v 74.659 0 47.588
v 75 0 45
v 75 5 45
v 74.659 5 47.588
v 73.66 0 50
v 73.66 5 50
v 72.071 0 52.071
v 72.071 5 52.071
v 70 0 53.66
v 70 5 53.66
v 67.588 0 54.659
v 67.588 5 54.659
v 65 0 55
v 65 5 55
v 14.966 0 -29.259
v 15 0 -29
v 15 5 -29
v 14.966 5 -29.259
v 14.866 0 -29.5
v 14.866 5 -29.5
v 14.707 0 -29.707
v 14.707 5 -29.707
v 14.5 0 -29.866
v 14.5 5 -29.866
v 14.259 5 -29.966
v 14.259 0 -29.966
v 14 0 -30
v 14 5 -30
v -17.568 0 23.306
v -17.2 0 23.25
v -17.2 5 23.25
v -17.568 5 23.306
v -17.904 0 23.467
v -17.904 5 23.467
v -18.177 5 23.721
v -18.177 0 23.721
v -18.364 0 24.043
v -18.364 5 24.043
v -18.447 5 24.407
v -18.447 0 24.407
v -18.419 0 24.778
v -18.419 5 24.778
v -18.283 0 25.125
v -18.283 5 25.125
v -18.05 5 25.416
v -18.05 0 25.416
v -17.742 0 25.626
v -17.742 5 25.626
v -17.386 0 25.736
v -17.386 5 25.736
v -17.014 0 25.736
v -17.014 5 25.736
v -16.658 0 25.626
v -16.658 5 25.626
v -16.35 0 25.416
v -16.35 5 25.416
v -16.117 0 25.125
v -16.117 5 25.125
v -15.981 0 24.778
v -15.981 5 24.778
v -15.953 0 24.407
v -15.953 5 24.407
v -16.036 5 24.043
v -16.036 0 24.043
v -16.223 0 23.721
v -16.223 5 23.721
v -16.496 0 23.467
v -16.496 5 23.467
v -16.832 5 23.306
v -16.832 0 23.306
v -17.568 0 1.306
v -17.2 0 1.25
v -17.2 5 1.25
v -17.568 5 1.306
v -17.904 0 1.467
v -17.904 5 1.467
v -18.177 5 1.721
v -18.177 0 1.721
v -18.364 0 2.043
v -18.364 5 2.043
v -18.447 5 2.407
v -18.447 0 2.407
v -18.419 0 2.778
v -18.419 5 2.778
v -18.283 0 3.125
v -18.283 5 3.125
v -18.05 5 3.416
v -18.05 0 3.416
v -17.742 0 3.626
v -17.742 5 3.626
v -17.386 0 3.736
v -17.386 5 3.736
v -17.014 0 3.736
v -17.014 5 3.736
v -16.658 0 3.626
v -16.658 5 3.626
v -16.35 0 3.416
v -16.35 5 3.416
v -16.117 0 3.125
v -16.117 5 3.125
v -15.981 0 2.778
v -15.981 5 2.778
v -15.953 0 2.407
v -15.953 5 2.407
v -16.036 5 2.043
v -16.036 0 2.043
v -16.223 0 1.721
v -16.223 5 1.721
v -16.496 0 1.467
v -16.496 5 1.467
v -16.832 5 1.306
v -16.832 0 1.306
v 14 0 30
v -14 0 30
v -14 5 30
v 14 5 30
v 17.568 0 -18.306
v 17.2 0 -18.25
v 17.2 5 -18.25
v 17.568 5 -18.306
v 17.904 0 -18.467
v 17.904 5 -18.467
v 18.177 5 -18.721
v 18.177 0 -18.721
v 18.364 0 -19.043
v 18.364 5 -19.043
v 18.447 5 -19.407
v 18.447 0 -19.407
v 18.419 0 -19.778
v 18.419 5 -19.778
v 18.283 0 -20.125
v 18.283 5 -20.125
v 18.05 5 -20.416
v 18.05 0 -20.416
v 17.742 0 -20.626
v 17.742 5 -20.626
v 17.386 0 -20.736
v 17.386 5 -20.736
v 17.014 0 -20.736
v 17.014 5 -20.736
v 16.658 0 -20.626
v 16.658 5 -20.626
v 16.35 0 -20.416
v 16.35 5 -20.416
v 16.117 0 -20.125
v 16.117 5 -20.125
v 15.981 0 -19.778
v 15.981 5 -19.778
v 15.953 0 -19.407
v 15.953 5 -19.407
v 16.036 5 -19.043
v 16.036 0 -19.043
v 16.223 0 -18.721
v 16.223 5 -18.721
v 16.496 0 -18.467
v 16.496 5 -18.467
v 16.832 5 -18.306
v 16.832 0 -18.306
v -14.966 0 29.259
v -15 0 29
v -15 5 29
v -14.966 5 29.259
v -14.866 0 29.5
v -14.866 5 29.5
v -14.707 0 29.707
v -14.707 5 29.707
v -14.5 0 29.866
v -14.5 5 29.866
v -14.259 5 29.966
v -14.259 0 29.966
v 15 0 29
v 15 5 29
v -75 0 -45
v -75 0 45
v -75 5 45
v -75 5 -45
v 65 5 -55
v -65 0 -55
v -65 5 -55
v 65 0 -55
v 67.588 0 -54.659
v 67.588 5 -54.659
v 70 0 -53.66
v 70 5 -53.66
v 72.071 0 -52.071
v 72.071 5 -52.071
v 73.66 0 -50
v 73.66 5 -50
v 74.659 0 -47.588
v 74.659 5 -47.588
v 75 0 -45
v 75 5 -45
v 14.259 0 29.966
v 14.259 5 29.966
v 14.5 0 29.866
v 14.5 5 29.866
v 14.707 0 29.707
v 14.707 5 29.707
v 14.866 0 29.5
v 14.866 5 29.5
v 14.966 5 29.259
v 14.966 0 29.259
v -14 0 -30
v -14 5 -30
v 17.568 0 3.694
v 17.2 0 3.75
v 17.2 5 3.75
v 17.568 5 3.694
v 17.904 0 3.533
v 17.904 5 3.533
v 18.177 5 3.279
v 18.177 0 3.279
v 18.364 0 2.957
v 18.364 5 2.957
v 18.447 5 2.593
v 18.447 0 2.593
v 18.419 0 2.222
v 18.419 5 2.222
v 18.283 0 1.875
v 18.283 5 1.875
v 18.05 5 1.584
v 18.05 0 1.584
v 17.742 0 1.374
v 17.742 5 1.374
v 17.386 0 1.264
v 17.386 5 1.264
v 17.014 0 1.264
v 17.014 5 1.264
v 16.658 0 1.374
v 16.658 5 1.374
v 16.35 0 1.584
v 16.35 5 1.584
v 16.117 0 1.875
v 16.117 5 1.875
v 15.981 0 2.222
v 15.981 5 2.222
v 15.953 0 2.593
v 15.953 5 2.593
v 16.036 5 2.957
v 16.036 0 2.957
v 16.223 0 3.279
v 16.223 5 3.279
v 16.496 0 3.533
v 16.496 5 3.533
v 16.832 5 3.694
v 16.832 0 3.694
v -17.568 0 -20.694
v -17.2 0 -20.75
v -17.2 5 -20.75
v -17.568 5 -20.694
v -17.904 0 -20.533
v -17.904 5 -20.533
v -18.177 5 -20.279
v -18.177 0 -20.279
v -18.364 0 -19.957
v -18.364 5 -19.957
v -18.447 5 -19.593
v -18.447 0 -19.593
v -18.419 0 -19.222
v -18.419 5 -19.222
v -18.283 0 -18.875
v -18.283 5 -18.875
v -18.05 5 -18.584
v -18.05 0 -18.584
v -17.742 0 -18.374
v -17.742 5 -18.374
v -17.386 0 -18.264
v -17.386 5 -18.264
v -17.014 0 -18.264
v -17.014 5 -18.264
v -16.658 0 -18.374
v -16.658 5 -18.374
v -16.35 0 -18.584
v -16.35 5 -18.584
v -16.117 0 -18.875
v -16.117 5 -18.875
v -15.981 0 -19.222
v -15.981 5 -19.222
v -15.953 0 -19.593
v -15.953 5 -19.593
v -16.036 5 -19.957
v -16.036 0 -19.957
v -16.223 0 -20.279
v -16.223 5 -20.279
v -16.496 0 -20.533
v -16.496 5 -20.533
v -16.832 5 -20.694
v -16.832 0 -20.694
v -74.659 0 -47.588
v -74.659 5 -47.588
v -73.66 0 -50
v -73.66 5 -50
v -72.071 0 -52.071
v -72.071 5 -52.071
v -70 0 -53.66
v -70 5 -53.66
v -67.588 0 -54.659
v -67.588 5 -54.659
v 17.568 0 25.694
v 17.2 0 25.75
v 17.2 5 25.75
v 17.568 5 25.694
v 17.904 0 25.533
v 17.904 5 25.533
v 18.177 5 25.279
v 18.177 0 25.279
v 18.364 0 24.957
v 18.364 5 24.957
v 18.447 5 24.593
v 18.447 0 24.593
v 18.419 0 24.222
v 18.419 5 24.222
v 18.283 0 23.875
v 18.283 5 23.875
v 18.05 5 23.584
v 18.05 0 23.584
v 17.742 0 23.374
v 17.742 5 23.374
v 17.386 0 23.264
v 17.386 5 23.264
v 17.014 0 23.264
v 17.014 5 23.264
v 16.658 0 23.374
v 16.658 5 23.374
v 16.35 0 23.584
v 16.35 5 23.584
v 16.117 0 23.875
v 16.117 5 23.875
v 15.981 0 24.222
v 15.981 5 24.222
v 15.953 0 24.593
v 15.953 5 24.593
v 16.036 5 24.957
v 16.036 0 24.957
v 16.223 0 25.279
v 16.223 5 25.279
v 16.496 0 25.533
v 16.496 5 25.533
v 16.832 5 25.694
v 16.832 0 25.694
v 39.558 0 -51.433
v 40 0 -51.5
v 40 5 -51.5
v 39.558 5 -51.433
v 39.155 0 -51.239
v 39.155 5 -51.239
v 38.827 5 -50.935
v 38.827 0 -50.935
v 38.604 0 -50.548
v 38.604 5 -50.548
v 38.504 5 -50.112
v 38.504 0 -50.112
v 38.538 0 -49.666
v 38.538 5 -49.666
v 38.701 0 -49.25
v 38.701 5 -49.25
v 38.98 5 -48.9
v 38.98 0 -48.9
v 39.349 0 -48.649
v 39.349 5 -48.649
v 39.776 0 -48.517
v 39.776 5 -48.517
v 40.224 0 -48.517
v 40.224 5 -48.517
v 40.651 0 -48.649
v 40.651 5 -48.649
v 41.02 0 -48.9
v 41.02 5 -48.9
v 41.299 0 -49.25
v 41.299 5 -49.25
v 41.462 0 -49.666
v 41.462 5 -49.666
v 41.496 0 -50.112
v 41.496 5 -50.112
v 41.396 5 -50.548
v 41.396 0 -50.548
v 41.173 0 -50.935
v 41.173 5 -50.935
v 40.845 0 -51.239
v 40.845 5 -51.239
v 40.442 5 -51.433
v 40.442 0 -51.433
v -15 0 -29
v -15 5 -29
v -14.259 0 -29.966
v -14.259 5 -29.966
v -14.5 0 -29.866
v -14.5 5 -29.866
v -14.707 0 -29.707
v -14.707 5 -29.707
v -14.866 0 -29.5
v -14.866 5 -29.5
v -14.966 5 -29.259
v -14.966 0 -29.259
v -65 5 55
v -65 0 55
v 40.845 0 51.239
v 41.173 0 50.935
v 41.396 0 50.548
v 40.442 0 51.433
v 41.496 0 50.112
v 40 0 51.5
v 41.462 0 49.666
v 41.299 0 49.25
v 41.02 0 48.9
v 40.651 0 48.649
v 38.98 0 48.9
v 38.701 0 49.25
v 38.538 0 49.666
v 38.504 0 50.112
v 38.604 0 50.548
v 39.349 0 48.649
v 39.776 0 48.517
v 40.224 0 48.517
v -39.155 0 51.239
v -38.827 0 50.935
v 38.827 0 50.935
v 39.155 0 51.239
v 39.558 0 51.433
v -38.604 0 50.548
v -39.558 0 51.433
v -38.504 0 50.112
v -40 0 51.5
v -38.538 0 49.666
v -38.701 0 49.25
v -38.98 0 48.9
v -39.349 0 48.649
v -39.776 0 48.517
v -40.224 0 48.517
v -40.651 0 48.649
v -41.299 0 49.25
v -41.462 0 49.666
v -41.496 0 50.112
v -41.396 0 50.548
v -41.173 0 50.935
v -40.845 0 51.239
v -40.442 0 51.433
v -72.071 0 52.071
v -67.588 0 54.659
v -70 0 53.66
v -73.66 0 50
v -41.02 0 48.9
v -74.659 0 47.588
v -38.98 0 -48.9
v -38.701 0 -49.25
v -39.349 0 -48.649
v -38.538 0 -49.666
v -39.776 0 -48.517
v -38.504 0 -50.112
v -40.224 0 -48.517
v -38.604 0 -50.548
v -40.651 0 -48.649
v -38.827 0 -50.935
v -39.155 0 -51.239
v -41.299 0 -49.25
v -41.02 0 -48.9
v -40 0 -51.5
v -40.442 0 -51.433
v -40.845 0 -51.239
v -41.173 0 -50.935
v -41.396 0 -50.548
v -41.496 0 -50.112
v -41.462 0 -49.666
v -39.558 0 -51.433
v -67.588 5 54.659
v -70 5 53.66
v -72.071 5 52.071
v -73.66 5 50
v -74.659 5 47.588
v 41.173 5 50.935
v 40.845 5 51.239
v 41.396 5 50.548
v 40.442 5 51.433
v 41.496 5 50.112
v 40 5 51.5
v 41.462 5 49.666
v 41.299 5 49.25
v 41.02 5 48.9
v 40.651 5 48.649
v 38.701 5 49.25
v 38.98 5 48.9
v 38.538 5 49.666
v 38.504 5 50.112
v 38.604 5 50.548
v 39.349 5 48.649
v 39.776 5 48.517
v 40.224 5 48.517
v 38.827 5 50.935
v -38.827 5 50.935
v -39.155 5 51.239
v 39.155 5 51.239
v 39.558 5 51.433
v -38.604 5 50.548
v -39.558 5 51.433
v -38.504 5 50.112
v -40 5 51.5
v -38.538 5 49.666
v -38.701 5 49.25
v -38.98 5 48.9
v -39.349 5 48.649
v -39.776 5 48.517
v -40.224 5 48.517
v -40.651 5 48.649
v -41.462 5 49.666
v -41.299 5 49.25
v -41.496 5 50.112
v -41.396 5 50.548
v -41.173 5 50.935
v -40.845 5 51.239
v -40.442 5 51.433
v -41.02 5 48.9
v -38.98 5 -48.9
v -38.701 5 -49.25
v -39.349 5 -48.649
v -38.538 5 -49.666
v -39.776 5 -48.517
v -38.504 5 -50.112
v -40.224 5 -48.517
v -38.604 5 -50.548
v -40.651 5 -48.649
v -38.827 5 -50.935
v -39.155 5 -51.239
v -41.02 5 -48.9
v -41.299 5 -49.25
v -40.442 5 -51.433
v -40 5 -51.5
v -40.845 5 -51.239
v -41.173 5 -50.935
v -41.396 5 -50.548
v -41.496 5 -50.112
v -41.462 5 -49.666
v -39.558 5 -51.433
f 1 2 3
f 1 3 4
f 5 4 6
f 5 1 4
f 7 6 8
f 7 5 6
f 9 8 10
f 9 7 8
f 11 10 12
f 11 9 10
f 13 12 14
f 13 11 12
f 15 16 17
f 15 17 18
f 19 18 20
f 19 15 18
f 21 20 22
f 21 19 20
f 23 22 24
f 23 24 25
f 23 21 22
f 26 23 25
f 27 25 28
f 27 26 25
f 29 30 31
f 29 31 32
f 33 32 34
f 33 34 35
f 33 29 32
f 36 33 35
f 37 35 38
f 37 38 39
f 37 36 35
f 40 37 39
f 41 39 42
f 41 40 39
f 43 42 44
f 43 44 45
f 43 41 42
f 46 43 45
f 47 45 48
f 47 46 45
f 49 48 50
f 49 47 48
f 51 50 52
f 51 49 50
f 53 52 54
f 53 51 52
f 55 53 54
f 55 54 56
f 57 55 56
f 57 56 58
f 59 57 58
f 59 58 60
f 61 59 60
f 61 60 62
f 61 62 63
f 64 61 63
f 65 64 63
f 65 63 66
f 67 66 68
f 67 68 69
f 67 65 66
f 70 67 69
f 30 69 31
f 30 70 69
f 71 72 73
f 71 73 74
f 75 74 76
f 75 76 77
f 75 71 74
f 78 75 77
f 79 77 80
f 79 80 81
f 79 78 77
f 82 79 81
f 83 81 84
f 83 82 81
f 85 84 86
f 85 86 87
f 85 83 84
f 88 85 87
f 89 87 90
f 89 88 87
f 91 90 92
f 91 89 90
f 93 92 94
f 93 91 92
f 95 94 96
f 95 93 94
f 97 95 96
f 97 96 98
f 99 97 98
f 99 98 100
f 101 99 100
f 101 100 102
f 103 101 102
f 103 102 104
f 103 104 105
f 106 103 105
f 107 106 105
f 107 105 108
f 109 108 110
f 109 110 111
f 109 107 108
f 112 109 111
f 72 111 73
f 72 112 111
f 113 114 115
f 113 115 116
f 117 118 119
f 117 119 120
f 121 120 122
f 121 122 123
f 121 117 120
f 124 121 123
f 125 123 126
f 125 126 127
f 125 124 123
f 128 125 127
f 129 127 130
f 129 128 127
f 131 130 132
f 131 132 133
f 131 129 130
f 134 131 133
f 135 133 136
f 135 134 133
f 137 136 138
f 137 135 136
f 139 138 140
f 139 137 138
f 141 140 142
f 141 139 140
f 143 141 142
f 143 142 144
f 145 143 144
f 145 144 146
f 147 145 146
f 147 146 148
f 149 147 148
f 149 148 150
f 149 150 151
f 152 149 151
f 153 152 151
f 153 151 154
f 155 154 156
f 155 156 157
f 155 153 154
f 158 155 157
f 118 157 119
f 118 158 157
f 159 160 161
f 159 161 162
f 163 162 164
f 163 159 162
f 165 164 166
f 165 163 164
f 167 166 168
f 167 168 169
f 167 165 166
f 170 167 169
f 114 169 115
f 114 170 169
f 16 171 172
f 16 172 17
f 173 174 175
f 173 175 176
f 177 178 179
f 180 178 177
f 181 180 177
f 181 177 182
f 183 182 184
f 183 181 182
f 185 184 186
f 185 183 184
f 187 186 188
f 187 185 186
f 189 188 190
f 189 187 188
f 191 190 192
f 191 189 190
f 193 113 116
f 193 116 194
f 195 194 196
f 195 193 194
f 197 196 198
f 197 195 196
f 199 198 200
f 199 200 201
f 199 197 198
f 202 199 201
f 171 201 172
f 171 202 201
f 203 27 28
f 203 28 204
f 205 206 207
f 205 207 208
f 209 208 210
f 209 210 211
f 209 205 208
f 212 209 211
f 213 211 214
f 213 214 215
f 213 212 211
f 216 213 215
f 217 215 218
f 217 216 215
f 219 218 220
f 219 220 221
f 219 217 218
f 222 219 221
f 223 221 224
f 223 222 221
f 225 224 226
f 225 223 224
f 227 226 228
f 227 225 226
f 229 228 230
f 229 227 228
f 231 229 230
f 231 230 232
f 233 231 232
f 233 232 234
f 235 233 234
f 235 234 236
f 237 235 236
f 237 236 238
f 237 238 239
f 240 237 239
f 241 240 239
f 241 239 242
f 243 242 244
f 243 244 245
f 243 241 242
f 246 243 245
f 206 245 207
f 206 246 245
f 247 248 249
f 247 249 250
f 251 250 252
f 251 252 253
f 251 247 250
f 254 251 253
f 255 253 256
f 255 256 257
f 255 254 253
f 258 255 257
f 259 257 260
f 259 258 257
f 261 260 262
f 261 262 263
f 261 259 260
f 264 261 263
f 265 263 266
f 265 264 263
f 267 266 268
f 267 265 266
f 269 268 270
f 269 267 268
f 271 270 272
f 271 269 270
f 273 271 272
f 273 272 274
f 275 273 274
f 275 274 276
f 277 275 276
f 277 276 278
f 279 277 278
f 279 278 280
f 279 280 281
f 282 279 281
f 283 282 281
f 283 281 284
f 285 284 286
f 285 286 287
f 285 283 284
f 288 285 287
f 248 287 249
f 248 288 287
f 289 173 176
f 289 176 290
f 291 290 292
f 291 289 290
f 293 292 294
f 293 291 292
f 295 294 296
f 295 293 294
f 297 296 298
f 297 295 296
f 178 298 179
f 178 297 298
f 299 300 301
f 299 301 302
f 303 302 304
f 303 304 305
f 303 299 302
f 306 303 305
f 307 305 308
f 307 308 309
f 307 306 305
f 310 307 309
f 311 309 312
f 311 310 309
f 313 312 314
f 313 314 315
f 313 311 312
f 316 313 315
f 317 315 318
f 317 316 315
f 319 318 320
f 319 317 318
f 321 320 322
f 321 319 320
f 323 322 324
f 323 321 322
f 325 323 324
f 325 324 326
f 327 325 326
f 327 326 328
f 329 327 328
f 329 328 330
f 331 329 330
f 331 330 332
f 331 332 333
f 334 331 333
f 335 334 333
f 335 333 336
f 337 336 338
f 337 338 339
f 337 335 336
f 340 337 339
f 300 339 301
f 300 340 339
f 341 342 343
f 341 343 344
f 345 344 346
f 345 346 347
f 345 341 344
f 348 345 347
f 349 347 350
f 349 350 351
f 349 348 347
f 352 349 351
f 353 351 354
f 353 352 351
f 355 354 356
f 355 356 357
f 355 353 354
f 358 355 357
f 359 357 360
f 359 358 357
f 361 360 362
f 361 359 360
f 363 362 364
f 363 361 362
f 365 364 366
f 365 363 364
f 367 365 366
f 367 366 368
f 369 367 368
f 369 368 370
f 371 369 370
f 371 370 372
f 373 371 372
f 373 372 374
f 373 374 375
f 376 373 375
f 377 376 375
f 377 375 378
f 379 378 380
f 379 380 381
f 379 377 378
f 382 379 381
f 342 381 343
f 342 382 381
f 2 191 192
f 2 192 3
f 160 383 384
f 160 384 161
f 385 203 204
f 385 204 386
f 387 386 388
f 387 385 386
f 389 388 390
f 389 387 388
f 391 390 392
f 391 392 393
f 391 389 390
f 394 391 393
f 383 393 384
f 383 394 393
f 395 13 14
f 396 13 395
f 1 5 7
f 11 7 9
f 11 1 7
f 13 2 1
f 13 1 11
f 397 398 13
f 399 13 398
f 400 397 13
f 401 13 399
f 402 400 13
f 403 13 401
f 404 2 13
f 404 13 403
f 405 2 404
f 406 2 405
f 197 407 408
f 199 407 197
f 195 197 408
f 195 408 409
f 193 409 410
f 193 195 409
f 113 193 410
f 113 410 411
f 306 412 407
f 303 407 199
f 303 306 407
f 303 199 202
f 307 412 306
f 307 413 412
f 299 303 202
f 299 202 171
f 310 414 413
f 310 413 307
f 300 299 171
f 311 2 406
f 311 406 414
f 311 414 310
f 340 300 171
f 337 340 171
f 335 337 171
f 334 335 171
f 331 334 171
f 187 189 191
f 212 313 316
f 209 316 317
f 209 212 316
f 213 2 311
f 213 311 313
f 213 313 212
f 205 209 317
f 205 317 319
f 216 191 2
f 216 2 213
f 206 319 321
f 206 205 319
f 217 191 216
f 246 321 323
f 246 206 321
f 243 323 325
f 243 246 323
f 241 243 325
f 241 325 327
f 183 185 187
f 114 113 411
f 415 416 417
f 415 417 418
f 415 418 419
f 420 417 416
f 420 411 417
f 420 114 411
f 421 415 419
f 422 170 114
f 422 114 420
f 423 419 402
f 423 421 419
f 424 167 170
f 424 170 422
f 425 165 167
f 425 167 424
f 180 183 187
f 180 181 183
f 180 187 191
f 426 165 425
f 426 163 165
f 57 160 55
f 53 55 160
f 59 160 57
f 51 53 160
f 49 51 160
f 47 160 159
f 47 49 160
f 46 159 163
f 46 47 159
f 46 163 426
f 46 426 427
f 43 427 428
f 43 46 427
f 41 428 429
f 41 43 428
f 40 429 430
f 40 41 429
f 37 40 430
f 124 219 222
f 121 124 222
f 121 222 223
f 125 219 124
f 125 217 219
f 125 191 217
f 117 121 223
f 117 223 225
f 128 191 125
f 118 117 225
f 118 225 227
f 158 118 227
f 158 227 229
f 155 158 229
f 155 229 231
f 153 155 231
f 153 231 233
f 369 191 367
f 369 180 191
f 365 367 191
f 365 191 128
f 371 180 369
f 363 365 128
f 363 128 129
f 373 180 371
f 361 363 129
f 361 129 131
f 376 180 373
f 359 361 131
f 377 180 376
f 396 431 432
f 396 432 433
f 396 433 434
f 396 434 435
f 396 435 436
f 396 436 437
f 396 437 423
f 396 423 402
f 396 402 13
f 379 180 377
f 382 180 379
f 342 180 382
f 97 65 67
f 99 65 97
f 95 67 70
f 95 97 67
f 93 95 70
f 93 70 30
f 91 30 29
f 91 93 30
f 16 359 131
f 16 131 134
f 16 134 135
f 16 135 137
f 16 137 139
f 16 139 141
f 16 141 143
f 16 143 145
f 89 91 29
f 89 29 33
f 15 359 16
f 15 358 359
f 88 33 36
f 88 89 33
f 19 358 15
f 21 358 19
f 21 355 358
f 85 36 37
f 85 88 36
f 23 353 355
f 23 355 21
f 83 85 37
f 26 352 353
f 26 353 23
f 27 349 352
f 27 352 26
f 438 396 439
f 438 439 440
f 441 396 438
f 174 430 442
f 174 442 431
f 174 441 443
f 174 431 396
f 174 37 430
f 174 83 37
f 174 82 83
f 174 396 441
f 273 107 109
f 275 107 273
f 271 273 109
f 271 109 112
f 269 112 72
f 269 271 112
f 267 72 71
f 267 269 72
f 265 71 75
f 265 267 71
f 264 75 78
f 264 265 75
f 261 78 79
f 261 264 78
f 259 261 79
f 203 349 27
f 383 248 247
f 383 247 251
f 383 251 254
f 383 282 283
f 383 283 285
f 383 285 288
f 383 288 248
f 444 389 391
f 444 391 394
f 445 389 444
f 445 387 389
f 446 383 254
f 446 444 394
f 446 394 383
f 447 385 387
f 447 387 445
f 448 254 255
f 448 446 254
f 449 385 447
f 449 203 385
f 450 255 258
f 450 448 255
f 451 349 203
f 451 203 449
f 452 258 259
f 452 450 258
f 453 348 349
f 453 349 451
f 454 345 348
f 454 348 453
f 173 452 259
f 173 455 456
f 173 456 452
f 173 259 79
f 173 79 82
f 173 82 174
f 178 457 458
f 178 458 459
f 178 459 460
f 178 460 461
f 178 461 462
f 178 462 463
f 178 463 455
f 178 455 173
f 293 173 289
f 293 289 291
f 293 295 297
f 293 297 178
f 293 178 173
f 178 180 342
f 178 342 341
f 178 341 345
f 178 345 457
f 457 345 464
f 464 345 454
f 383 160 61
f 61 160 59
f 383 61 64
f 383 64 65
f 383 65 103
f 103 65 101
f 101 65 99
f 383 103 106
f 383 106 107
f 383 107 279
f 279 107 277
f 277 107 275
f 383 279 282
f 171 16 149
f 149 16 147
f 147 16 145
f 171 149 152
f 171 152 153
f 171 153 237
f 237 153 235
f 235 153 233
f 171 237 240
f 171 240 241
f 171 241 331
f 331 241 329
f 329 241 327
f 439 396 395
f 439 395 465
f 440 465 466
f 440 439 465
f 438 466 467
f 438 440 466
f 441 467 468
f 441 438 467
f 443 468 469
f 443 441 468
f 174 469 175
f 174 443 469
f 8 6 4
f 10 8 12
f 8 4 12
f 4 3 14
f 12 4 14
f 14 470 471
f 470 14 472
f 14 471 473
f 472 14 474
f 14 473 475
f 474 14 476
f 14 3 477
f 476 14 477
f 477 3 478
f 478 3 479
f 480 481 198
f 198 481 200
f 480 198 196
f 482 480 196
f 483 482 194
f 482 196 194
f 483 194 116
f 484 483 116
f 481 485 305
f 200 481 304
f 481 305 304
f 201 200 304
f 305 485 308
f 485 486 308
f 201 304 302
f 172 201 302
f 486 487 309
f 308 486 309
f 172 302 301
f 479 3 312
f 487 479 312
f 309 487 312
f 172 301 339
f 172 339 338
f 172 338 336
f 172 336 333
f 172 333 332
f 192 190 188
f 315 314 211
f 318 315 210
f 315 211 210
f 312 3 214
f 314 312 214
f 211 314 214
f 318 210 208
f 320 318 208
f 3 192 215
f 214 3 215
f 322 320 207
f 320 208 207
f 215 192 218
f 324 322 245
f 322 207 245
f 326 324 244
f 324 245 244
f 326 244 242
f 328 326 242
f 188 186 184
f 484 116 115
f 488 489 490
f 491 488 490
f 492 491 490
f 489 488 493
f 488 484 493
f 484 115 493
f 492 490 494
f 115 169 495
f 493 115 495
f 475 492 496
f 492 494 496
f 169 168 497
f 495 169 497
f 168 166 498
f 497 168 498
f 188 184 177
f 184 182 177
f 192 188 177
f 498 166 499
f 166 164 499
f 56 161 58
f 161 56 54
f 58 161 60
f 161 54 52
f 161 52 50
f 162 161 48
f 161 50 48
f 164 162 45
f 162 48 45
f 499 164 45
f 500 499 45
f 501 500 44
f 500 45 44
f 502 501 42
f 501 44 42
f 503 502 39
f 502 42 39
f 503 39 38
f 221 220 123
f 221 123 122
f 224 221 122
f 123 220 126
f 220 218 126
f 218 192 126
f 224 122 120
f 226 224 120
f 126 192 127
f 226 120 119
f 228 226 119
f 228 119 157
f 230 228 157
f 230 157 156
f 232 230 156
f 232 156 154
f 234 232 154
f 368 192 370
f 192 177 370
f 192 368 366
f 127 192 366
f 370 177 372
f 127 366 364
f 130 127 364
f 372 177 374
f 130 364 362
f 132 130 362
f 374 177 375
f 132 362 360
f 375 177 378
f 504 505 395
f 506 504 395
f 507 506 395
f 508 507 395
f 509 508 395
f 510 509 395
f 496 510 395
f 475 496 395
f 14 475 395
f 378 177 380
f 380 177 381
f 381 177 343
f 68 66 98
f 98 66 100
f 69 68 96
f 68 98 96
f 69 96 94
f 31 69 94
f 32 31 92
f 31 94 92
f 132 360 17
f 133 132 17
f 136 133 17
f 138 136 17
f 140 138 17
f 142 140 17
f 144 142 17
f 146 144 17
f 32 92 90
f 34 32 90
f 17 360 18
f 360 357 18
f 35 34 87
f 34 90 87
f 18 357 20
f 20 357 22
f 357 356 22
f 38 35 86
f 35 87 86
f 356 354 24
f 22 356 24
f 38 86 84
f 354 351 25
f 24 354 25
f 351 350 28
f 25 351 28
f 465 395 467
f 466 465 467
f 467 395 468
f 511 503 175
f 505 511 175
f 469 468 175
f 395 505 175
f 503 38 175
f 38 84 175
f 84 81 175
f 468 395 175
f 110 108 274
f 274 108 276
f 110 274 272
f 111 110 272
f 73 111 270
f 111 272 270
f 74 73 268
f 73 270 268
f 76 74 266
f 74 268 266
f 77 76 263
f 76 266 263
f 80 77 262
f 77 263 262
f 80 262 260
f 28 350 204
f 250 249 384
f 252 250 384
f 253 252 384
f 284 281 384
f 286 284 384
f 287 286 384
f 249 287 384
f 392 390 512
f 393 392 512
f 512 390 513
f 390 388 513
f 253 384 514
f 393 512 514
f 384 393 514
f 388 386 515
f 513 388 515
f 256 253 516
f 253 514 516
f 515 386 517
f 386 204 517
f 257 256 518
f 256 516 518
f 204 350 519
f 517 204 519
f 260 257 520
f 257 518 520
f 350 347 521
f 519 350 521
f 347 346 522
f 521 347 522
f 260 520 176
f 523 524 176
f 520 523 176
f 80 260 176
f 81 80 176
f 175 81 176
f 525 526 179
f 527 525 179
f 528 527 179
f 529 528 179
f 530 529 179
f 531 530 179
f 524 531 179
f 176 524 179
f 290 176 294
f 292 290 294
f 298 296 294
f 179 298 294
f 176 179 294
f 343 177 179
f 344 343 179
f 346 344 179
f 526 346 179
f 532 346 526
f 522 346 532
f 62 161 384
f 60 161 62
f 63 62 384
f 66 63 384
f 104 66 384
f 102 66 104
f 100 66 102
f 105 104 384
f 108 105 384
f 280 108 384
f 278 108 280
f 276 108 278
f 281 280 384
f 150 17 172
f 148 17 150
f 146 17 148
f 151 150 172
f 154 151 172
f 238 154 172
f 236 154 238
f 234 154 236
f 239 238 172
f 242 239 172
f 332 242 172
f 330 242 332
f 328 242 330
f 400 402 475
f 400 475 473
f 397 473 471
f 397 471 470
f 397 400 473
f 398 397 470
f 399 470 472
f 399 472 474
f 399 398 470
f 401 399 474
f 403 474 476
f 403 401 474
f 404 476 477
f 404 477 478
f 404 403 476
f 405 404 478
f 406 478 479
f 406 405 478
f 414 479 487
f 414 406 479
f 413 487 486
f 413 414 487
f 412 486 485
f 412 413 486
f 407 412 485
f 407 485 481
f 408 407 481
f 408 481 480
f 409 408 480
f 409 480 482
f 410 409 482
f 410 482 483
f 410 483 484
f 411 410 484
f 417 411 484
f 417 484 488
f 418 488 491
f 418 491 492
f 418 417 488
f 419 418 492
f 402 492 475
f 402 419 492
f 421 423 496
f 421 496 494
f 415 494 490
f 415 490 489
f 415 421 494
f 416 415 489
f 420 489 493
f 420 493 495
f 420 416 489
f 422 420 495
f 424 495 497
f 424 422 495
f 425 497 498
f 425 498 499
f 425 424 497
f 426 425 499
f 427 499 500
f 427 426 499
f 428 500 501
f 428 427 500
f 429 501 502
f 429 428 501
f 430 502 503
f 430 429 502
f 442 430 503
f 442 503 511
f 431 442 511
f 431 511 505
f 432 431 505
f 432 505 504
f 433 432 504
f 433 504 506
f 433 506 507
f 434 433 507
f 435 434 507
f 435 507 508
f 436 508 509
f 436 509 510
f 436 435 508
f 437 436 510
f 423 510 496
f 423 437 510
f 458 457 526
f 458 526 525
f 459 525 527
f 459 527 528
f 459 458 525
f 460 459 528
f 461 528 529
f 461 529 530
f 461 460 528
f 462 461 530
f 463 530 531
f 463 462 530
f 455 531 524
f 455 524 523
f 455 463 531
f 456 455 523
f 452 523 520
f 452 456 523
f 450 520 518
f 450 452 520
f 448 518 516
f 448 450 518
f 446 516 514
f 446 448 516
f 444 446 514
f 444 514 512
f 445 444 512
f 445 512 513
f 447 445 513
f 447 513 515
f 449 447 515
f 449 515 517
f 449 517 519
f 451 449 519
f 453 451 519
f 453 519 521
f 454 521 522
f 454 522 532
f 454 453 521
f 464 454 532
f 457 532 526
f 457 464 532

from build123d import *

# Parameters (mm, degrees)
ESBO_O1_R                = 1.5
ESBO_O1_R_2              = 1.25
RESSALTO_EXTRUS_O1_DEPTH = 5


with BuildPart() as part:
    # Esboço1 → Ressalto-extrusão1 (new body)
    with BuildSketch(Plane(origin=(0, 0, 0), x_dir=(1, 0, 0), z_dir=(0, 1, 0))):
        with BuildLine():
            Line((65, -55), (-65, -55))
            ThreePointArc((-65, -55), (-72.071067812, -52.071067812), (-75, -45))
            Line((-75, -45), (-75, 45))
            ThreePointArc((-75, 45), (-72.071067812, 52.071067812), (-65, 55))
            Line((-65, 55), (65, 55))
            ThreePointArc((65, 55), (72.071067812, 52.071067812), (75, 45))
            Line((75, 45), (75, -45))
            ThreePointArc((75, -45), (72.071067812, -52.071067812), (65, -55))
        make_face()
        with Locations(Location((-40, -50, 0), (0, 0, 270))):
            Circle(ESBO_O1_R, mode=Mode.SUBTRACT)
        with Locations(Location((40, -50, 0), (0, 0, 270))):
            Circle(ESBO_O1_R, mode=Mode.SUBTRACT)
        with Locations(Location((40, 50, 0), (0, 0, 90))):
            Circle(ESBO_O1_R, mode=Mode.SUBTRACT)
        with Locations(Location((-40, 50, 0), (0, 0, 90))):
            Circle(ESBO_O1_R, mode=Mode.SUBTRACT)
        with Locations(Location((17.2, 19.5, 0), (0, 0, 270))):
            Circle(ESBO_O1_R_2, mode=Mode.SUBTRACT)
        with Locations(Location((17.2, -2.5, 0), (0, 0, 270))):
            Circle(ESBO_O1_R_2, mode=Mode.SUBTRACT)
        with Locations(Location((17.2, -24.5, 0), (0, 0, 270))):
            Circle(ESBO_O1_R_2, mode=Mode.SUBTRACT)
        with Locations(Location((-17.2, -24.5, 0), (0, 0, 90))):
            Circle(ESBO_O1_R_2, mode=Mode.SUBTRACT)
        with Locations(Location((-17.2, -2.5, 0), (0, 0, 90))):
            Circle(ESBO_O1_R_2, mode=Mode.SUBTRACT)
        with Locations(Location((-17.2, 19.5, 0), (0, 0, 90))):
            Circle(ESBO_O1_R_2, mode=Mode.SUBTRACT)
        with BuildLine():
            Line((14, 30), (-14, 30))
            ThreePointArc((-14, 30), (-14.707106781, 29.707106781), (-15, 29))
            Line((-15, 29), (-15, -29))
            ThreePointArc((-15, -29), (-14.707106781, -29.707106781), (-14, -30))
            Line((-14, -30), (14, -30))
            ThreePointArc((14, -30), (14.707106781, -29.707106781), (15, -29))
            Line((15, -29), (15, 29))
            ThreePointArc((15, 29), (14.707106781, 29.707106781), (14, 30))
        make_face(mode=Mode.SUBTRACT)
    extrude(amount=RESSALTO_EXTRUS_O1_DEPTH)


solid = part.part
